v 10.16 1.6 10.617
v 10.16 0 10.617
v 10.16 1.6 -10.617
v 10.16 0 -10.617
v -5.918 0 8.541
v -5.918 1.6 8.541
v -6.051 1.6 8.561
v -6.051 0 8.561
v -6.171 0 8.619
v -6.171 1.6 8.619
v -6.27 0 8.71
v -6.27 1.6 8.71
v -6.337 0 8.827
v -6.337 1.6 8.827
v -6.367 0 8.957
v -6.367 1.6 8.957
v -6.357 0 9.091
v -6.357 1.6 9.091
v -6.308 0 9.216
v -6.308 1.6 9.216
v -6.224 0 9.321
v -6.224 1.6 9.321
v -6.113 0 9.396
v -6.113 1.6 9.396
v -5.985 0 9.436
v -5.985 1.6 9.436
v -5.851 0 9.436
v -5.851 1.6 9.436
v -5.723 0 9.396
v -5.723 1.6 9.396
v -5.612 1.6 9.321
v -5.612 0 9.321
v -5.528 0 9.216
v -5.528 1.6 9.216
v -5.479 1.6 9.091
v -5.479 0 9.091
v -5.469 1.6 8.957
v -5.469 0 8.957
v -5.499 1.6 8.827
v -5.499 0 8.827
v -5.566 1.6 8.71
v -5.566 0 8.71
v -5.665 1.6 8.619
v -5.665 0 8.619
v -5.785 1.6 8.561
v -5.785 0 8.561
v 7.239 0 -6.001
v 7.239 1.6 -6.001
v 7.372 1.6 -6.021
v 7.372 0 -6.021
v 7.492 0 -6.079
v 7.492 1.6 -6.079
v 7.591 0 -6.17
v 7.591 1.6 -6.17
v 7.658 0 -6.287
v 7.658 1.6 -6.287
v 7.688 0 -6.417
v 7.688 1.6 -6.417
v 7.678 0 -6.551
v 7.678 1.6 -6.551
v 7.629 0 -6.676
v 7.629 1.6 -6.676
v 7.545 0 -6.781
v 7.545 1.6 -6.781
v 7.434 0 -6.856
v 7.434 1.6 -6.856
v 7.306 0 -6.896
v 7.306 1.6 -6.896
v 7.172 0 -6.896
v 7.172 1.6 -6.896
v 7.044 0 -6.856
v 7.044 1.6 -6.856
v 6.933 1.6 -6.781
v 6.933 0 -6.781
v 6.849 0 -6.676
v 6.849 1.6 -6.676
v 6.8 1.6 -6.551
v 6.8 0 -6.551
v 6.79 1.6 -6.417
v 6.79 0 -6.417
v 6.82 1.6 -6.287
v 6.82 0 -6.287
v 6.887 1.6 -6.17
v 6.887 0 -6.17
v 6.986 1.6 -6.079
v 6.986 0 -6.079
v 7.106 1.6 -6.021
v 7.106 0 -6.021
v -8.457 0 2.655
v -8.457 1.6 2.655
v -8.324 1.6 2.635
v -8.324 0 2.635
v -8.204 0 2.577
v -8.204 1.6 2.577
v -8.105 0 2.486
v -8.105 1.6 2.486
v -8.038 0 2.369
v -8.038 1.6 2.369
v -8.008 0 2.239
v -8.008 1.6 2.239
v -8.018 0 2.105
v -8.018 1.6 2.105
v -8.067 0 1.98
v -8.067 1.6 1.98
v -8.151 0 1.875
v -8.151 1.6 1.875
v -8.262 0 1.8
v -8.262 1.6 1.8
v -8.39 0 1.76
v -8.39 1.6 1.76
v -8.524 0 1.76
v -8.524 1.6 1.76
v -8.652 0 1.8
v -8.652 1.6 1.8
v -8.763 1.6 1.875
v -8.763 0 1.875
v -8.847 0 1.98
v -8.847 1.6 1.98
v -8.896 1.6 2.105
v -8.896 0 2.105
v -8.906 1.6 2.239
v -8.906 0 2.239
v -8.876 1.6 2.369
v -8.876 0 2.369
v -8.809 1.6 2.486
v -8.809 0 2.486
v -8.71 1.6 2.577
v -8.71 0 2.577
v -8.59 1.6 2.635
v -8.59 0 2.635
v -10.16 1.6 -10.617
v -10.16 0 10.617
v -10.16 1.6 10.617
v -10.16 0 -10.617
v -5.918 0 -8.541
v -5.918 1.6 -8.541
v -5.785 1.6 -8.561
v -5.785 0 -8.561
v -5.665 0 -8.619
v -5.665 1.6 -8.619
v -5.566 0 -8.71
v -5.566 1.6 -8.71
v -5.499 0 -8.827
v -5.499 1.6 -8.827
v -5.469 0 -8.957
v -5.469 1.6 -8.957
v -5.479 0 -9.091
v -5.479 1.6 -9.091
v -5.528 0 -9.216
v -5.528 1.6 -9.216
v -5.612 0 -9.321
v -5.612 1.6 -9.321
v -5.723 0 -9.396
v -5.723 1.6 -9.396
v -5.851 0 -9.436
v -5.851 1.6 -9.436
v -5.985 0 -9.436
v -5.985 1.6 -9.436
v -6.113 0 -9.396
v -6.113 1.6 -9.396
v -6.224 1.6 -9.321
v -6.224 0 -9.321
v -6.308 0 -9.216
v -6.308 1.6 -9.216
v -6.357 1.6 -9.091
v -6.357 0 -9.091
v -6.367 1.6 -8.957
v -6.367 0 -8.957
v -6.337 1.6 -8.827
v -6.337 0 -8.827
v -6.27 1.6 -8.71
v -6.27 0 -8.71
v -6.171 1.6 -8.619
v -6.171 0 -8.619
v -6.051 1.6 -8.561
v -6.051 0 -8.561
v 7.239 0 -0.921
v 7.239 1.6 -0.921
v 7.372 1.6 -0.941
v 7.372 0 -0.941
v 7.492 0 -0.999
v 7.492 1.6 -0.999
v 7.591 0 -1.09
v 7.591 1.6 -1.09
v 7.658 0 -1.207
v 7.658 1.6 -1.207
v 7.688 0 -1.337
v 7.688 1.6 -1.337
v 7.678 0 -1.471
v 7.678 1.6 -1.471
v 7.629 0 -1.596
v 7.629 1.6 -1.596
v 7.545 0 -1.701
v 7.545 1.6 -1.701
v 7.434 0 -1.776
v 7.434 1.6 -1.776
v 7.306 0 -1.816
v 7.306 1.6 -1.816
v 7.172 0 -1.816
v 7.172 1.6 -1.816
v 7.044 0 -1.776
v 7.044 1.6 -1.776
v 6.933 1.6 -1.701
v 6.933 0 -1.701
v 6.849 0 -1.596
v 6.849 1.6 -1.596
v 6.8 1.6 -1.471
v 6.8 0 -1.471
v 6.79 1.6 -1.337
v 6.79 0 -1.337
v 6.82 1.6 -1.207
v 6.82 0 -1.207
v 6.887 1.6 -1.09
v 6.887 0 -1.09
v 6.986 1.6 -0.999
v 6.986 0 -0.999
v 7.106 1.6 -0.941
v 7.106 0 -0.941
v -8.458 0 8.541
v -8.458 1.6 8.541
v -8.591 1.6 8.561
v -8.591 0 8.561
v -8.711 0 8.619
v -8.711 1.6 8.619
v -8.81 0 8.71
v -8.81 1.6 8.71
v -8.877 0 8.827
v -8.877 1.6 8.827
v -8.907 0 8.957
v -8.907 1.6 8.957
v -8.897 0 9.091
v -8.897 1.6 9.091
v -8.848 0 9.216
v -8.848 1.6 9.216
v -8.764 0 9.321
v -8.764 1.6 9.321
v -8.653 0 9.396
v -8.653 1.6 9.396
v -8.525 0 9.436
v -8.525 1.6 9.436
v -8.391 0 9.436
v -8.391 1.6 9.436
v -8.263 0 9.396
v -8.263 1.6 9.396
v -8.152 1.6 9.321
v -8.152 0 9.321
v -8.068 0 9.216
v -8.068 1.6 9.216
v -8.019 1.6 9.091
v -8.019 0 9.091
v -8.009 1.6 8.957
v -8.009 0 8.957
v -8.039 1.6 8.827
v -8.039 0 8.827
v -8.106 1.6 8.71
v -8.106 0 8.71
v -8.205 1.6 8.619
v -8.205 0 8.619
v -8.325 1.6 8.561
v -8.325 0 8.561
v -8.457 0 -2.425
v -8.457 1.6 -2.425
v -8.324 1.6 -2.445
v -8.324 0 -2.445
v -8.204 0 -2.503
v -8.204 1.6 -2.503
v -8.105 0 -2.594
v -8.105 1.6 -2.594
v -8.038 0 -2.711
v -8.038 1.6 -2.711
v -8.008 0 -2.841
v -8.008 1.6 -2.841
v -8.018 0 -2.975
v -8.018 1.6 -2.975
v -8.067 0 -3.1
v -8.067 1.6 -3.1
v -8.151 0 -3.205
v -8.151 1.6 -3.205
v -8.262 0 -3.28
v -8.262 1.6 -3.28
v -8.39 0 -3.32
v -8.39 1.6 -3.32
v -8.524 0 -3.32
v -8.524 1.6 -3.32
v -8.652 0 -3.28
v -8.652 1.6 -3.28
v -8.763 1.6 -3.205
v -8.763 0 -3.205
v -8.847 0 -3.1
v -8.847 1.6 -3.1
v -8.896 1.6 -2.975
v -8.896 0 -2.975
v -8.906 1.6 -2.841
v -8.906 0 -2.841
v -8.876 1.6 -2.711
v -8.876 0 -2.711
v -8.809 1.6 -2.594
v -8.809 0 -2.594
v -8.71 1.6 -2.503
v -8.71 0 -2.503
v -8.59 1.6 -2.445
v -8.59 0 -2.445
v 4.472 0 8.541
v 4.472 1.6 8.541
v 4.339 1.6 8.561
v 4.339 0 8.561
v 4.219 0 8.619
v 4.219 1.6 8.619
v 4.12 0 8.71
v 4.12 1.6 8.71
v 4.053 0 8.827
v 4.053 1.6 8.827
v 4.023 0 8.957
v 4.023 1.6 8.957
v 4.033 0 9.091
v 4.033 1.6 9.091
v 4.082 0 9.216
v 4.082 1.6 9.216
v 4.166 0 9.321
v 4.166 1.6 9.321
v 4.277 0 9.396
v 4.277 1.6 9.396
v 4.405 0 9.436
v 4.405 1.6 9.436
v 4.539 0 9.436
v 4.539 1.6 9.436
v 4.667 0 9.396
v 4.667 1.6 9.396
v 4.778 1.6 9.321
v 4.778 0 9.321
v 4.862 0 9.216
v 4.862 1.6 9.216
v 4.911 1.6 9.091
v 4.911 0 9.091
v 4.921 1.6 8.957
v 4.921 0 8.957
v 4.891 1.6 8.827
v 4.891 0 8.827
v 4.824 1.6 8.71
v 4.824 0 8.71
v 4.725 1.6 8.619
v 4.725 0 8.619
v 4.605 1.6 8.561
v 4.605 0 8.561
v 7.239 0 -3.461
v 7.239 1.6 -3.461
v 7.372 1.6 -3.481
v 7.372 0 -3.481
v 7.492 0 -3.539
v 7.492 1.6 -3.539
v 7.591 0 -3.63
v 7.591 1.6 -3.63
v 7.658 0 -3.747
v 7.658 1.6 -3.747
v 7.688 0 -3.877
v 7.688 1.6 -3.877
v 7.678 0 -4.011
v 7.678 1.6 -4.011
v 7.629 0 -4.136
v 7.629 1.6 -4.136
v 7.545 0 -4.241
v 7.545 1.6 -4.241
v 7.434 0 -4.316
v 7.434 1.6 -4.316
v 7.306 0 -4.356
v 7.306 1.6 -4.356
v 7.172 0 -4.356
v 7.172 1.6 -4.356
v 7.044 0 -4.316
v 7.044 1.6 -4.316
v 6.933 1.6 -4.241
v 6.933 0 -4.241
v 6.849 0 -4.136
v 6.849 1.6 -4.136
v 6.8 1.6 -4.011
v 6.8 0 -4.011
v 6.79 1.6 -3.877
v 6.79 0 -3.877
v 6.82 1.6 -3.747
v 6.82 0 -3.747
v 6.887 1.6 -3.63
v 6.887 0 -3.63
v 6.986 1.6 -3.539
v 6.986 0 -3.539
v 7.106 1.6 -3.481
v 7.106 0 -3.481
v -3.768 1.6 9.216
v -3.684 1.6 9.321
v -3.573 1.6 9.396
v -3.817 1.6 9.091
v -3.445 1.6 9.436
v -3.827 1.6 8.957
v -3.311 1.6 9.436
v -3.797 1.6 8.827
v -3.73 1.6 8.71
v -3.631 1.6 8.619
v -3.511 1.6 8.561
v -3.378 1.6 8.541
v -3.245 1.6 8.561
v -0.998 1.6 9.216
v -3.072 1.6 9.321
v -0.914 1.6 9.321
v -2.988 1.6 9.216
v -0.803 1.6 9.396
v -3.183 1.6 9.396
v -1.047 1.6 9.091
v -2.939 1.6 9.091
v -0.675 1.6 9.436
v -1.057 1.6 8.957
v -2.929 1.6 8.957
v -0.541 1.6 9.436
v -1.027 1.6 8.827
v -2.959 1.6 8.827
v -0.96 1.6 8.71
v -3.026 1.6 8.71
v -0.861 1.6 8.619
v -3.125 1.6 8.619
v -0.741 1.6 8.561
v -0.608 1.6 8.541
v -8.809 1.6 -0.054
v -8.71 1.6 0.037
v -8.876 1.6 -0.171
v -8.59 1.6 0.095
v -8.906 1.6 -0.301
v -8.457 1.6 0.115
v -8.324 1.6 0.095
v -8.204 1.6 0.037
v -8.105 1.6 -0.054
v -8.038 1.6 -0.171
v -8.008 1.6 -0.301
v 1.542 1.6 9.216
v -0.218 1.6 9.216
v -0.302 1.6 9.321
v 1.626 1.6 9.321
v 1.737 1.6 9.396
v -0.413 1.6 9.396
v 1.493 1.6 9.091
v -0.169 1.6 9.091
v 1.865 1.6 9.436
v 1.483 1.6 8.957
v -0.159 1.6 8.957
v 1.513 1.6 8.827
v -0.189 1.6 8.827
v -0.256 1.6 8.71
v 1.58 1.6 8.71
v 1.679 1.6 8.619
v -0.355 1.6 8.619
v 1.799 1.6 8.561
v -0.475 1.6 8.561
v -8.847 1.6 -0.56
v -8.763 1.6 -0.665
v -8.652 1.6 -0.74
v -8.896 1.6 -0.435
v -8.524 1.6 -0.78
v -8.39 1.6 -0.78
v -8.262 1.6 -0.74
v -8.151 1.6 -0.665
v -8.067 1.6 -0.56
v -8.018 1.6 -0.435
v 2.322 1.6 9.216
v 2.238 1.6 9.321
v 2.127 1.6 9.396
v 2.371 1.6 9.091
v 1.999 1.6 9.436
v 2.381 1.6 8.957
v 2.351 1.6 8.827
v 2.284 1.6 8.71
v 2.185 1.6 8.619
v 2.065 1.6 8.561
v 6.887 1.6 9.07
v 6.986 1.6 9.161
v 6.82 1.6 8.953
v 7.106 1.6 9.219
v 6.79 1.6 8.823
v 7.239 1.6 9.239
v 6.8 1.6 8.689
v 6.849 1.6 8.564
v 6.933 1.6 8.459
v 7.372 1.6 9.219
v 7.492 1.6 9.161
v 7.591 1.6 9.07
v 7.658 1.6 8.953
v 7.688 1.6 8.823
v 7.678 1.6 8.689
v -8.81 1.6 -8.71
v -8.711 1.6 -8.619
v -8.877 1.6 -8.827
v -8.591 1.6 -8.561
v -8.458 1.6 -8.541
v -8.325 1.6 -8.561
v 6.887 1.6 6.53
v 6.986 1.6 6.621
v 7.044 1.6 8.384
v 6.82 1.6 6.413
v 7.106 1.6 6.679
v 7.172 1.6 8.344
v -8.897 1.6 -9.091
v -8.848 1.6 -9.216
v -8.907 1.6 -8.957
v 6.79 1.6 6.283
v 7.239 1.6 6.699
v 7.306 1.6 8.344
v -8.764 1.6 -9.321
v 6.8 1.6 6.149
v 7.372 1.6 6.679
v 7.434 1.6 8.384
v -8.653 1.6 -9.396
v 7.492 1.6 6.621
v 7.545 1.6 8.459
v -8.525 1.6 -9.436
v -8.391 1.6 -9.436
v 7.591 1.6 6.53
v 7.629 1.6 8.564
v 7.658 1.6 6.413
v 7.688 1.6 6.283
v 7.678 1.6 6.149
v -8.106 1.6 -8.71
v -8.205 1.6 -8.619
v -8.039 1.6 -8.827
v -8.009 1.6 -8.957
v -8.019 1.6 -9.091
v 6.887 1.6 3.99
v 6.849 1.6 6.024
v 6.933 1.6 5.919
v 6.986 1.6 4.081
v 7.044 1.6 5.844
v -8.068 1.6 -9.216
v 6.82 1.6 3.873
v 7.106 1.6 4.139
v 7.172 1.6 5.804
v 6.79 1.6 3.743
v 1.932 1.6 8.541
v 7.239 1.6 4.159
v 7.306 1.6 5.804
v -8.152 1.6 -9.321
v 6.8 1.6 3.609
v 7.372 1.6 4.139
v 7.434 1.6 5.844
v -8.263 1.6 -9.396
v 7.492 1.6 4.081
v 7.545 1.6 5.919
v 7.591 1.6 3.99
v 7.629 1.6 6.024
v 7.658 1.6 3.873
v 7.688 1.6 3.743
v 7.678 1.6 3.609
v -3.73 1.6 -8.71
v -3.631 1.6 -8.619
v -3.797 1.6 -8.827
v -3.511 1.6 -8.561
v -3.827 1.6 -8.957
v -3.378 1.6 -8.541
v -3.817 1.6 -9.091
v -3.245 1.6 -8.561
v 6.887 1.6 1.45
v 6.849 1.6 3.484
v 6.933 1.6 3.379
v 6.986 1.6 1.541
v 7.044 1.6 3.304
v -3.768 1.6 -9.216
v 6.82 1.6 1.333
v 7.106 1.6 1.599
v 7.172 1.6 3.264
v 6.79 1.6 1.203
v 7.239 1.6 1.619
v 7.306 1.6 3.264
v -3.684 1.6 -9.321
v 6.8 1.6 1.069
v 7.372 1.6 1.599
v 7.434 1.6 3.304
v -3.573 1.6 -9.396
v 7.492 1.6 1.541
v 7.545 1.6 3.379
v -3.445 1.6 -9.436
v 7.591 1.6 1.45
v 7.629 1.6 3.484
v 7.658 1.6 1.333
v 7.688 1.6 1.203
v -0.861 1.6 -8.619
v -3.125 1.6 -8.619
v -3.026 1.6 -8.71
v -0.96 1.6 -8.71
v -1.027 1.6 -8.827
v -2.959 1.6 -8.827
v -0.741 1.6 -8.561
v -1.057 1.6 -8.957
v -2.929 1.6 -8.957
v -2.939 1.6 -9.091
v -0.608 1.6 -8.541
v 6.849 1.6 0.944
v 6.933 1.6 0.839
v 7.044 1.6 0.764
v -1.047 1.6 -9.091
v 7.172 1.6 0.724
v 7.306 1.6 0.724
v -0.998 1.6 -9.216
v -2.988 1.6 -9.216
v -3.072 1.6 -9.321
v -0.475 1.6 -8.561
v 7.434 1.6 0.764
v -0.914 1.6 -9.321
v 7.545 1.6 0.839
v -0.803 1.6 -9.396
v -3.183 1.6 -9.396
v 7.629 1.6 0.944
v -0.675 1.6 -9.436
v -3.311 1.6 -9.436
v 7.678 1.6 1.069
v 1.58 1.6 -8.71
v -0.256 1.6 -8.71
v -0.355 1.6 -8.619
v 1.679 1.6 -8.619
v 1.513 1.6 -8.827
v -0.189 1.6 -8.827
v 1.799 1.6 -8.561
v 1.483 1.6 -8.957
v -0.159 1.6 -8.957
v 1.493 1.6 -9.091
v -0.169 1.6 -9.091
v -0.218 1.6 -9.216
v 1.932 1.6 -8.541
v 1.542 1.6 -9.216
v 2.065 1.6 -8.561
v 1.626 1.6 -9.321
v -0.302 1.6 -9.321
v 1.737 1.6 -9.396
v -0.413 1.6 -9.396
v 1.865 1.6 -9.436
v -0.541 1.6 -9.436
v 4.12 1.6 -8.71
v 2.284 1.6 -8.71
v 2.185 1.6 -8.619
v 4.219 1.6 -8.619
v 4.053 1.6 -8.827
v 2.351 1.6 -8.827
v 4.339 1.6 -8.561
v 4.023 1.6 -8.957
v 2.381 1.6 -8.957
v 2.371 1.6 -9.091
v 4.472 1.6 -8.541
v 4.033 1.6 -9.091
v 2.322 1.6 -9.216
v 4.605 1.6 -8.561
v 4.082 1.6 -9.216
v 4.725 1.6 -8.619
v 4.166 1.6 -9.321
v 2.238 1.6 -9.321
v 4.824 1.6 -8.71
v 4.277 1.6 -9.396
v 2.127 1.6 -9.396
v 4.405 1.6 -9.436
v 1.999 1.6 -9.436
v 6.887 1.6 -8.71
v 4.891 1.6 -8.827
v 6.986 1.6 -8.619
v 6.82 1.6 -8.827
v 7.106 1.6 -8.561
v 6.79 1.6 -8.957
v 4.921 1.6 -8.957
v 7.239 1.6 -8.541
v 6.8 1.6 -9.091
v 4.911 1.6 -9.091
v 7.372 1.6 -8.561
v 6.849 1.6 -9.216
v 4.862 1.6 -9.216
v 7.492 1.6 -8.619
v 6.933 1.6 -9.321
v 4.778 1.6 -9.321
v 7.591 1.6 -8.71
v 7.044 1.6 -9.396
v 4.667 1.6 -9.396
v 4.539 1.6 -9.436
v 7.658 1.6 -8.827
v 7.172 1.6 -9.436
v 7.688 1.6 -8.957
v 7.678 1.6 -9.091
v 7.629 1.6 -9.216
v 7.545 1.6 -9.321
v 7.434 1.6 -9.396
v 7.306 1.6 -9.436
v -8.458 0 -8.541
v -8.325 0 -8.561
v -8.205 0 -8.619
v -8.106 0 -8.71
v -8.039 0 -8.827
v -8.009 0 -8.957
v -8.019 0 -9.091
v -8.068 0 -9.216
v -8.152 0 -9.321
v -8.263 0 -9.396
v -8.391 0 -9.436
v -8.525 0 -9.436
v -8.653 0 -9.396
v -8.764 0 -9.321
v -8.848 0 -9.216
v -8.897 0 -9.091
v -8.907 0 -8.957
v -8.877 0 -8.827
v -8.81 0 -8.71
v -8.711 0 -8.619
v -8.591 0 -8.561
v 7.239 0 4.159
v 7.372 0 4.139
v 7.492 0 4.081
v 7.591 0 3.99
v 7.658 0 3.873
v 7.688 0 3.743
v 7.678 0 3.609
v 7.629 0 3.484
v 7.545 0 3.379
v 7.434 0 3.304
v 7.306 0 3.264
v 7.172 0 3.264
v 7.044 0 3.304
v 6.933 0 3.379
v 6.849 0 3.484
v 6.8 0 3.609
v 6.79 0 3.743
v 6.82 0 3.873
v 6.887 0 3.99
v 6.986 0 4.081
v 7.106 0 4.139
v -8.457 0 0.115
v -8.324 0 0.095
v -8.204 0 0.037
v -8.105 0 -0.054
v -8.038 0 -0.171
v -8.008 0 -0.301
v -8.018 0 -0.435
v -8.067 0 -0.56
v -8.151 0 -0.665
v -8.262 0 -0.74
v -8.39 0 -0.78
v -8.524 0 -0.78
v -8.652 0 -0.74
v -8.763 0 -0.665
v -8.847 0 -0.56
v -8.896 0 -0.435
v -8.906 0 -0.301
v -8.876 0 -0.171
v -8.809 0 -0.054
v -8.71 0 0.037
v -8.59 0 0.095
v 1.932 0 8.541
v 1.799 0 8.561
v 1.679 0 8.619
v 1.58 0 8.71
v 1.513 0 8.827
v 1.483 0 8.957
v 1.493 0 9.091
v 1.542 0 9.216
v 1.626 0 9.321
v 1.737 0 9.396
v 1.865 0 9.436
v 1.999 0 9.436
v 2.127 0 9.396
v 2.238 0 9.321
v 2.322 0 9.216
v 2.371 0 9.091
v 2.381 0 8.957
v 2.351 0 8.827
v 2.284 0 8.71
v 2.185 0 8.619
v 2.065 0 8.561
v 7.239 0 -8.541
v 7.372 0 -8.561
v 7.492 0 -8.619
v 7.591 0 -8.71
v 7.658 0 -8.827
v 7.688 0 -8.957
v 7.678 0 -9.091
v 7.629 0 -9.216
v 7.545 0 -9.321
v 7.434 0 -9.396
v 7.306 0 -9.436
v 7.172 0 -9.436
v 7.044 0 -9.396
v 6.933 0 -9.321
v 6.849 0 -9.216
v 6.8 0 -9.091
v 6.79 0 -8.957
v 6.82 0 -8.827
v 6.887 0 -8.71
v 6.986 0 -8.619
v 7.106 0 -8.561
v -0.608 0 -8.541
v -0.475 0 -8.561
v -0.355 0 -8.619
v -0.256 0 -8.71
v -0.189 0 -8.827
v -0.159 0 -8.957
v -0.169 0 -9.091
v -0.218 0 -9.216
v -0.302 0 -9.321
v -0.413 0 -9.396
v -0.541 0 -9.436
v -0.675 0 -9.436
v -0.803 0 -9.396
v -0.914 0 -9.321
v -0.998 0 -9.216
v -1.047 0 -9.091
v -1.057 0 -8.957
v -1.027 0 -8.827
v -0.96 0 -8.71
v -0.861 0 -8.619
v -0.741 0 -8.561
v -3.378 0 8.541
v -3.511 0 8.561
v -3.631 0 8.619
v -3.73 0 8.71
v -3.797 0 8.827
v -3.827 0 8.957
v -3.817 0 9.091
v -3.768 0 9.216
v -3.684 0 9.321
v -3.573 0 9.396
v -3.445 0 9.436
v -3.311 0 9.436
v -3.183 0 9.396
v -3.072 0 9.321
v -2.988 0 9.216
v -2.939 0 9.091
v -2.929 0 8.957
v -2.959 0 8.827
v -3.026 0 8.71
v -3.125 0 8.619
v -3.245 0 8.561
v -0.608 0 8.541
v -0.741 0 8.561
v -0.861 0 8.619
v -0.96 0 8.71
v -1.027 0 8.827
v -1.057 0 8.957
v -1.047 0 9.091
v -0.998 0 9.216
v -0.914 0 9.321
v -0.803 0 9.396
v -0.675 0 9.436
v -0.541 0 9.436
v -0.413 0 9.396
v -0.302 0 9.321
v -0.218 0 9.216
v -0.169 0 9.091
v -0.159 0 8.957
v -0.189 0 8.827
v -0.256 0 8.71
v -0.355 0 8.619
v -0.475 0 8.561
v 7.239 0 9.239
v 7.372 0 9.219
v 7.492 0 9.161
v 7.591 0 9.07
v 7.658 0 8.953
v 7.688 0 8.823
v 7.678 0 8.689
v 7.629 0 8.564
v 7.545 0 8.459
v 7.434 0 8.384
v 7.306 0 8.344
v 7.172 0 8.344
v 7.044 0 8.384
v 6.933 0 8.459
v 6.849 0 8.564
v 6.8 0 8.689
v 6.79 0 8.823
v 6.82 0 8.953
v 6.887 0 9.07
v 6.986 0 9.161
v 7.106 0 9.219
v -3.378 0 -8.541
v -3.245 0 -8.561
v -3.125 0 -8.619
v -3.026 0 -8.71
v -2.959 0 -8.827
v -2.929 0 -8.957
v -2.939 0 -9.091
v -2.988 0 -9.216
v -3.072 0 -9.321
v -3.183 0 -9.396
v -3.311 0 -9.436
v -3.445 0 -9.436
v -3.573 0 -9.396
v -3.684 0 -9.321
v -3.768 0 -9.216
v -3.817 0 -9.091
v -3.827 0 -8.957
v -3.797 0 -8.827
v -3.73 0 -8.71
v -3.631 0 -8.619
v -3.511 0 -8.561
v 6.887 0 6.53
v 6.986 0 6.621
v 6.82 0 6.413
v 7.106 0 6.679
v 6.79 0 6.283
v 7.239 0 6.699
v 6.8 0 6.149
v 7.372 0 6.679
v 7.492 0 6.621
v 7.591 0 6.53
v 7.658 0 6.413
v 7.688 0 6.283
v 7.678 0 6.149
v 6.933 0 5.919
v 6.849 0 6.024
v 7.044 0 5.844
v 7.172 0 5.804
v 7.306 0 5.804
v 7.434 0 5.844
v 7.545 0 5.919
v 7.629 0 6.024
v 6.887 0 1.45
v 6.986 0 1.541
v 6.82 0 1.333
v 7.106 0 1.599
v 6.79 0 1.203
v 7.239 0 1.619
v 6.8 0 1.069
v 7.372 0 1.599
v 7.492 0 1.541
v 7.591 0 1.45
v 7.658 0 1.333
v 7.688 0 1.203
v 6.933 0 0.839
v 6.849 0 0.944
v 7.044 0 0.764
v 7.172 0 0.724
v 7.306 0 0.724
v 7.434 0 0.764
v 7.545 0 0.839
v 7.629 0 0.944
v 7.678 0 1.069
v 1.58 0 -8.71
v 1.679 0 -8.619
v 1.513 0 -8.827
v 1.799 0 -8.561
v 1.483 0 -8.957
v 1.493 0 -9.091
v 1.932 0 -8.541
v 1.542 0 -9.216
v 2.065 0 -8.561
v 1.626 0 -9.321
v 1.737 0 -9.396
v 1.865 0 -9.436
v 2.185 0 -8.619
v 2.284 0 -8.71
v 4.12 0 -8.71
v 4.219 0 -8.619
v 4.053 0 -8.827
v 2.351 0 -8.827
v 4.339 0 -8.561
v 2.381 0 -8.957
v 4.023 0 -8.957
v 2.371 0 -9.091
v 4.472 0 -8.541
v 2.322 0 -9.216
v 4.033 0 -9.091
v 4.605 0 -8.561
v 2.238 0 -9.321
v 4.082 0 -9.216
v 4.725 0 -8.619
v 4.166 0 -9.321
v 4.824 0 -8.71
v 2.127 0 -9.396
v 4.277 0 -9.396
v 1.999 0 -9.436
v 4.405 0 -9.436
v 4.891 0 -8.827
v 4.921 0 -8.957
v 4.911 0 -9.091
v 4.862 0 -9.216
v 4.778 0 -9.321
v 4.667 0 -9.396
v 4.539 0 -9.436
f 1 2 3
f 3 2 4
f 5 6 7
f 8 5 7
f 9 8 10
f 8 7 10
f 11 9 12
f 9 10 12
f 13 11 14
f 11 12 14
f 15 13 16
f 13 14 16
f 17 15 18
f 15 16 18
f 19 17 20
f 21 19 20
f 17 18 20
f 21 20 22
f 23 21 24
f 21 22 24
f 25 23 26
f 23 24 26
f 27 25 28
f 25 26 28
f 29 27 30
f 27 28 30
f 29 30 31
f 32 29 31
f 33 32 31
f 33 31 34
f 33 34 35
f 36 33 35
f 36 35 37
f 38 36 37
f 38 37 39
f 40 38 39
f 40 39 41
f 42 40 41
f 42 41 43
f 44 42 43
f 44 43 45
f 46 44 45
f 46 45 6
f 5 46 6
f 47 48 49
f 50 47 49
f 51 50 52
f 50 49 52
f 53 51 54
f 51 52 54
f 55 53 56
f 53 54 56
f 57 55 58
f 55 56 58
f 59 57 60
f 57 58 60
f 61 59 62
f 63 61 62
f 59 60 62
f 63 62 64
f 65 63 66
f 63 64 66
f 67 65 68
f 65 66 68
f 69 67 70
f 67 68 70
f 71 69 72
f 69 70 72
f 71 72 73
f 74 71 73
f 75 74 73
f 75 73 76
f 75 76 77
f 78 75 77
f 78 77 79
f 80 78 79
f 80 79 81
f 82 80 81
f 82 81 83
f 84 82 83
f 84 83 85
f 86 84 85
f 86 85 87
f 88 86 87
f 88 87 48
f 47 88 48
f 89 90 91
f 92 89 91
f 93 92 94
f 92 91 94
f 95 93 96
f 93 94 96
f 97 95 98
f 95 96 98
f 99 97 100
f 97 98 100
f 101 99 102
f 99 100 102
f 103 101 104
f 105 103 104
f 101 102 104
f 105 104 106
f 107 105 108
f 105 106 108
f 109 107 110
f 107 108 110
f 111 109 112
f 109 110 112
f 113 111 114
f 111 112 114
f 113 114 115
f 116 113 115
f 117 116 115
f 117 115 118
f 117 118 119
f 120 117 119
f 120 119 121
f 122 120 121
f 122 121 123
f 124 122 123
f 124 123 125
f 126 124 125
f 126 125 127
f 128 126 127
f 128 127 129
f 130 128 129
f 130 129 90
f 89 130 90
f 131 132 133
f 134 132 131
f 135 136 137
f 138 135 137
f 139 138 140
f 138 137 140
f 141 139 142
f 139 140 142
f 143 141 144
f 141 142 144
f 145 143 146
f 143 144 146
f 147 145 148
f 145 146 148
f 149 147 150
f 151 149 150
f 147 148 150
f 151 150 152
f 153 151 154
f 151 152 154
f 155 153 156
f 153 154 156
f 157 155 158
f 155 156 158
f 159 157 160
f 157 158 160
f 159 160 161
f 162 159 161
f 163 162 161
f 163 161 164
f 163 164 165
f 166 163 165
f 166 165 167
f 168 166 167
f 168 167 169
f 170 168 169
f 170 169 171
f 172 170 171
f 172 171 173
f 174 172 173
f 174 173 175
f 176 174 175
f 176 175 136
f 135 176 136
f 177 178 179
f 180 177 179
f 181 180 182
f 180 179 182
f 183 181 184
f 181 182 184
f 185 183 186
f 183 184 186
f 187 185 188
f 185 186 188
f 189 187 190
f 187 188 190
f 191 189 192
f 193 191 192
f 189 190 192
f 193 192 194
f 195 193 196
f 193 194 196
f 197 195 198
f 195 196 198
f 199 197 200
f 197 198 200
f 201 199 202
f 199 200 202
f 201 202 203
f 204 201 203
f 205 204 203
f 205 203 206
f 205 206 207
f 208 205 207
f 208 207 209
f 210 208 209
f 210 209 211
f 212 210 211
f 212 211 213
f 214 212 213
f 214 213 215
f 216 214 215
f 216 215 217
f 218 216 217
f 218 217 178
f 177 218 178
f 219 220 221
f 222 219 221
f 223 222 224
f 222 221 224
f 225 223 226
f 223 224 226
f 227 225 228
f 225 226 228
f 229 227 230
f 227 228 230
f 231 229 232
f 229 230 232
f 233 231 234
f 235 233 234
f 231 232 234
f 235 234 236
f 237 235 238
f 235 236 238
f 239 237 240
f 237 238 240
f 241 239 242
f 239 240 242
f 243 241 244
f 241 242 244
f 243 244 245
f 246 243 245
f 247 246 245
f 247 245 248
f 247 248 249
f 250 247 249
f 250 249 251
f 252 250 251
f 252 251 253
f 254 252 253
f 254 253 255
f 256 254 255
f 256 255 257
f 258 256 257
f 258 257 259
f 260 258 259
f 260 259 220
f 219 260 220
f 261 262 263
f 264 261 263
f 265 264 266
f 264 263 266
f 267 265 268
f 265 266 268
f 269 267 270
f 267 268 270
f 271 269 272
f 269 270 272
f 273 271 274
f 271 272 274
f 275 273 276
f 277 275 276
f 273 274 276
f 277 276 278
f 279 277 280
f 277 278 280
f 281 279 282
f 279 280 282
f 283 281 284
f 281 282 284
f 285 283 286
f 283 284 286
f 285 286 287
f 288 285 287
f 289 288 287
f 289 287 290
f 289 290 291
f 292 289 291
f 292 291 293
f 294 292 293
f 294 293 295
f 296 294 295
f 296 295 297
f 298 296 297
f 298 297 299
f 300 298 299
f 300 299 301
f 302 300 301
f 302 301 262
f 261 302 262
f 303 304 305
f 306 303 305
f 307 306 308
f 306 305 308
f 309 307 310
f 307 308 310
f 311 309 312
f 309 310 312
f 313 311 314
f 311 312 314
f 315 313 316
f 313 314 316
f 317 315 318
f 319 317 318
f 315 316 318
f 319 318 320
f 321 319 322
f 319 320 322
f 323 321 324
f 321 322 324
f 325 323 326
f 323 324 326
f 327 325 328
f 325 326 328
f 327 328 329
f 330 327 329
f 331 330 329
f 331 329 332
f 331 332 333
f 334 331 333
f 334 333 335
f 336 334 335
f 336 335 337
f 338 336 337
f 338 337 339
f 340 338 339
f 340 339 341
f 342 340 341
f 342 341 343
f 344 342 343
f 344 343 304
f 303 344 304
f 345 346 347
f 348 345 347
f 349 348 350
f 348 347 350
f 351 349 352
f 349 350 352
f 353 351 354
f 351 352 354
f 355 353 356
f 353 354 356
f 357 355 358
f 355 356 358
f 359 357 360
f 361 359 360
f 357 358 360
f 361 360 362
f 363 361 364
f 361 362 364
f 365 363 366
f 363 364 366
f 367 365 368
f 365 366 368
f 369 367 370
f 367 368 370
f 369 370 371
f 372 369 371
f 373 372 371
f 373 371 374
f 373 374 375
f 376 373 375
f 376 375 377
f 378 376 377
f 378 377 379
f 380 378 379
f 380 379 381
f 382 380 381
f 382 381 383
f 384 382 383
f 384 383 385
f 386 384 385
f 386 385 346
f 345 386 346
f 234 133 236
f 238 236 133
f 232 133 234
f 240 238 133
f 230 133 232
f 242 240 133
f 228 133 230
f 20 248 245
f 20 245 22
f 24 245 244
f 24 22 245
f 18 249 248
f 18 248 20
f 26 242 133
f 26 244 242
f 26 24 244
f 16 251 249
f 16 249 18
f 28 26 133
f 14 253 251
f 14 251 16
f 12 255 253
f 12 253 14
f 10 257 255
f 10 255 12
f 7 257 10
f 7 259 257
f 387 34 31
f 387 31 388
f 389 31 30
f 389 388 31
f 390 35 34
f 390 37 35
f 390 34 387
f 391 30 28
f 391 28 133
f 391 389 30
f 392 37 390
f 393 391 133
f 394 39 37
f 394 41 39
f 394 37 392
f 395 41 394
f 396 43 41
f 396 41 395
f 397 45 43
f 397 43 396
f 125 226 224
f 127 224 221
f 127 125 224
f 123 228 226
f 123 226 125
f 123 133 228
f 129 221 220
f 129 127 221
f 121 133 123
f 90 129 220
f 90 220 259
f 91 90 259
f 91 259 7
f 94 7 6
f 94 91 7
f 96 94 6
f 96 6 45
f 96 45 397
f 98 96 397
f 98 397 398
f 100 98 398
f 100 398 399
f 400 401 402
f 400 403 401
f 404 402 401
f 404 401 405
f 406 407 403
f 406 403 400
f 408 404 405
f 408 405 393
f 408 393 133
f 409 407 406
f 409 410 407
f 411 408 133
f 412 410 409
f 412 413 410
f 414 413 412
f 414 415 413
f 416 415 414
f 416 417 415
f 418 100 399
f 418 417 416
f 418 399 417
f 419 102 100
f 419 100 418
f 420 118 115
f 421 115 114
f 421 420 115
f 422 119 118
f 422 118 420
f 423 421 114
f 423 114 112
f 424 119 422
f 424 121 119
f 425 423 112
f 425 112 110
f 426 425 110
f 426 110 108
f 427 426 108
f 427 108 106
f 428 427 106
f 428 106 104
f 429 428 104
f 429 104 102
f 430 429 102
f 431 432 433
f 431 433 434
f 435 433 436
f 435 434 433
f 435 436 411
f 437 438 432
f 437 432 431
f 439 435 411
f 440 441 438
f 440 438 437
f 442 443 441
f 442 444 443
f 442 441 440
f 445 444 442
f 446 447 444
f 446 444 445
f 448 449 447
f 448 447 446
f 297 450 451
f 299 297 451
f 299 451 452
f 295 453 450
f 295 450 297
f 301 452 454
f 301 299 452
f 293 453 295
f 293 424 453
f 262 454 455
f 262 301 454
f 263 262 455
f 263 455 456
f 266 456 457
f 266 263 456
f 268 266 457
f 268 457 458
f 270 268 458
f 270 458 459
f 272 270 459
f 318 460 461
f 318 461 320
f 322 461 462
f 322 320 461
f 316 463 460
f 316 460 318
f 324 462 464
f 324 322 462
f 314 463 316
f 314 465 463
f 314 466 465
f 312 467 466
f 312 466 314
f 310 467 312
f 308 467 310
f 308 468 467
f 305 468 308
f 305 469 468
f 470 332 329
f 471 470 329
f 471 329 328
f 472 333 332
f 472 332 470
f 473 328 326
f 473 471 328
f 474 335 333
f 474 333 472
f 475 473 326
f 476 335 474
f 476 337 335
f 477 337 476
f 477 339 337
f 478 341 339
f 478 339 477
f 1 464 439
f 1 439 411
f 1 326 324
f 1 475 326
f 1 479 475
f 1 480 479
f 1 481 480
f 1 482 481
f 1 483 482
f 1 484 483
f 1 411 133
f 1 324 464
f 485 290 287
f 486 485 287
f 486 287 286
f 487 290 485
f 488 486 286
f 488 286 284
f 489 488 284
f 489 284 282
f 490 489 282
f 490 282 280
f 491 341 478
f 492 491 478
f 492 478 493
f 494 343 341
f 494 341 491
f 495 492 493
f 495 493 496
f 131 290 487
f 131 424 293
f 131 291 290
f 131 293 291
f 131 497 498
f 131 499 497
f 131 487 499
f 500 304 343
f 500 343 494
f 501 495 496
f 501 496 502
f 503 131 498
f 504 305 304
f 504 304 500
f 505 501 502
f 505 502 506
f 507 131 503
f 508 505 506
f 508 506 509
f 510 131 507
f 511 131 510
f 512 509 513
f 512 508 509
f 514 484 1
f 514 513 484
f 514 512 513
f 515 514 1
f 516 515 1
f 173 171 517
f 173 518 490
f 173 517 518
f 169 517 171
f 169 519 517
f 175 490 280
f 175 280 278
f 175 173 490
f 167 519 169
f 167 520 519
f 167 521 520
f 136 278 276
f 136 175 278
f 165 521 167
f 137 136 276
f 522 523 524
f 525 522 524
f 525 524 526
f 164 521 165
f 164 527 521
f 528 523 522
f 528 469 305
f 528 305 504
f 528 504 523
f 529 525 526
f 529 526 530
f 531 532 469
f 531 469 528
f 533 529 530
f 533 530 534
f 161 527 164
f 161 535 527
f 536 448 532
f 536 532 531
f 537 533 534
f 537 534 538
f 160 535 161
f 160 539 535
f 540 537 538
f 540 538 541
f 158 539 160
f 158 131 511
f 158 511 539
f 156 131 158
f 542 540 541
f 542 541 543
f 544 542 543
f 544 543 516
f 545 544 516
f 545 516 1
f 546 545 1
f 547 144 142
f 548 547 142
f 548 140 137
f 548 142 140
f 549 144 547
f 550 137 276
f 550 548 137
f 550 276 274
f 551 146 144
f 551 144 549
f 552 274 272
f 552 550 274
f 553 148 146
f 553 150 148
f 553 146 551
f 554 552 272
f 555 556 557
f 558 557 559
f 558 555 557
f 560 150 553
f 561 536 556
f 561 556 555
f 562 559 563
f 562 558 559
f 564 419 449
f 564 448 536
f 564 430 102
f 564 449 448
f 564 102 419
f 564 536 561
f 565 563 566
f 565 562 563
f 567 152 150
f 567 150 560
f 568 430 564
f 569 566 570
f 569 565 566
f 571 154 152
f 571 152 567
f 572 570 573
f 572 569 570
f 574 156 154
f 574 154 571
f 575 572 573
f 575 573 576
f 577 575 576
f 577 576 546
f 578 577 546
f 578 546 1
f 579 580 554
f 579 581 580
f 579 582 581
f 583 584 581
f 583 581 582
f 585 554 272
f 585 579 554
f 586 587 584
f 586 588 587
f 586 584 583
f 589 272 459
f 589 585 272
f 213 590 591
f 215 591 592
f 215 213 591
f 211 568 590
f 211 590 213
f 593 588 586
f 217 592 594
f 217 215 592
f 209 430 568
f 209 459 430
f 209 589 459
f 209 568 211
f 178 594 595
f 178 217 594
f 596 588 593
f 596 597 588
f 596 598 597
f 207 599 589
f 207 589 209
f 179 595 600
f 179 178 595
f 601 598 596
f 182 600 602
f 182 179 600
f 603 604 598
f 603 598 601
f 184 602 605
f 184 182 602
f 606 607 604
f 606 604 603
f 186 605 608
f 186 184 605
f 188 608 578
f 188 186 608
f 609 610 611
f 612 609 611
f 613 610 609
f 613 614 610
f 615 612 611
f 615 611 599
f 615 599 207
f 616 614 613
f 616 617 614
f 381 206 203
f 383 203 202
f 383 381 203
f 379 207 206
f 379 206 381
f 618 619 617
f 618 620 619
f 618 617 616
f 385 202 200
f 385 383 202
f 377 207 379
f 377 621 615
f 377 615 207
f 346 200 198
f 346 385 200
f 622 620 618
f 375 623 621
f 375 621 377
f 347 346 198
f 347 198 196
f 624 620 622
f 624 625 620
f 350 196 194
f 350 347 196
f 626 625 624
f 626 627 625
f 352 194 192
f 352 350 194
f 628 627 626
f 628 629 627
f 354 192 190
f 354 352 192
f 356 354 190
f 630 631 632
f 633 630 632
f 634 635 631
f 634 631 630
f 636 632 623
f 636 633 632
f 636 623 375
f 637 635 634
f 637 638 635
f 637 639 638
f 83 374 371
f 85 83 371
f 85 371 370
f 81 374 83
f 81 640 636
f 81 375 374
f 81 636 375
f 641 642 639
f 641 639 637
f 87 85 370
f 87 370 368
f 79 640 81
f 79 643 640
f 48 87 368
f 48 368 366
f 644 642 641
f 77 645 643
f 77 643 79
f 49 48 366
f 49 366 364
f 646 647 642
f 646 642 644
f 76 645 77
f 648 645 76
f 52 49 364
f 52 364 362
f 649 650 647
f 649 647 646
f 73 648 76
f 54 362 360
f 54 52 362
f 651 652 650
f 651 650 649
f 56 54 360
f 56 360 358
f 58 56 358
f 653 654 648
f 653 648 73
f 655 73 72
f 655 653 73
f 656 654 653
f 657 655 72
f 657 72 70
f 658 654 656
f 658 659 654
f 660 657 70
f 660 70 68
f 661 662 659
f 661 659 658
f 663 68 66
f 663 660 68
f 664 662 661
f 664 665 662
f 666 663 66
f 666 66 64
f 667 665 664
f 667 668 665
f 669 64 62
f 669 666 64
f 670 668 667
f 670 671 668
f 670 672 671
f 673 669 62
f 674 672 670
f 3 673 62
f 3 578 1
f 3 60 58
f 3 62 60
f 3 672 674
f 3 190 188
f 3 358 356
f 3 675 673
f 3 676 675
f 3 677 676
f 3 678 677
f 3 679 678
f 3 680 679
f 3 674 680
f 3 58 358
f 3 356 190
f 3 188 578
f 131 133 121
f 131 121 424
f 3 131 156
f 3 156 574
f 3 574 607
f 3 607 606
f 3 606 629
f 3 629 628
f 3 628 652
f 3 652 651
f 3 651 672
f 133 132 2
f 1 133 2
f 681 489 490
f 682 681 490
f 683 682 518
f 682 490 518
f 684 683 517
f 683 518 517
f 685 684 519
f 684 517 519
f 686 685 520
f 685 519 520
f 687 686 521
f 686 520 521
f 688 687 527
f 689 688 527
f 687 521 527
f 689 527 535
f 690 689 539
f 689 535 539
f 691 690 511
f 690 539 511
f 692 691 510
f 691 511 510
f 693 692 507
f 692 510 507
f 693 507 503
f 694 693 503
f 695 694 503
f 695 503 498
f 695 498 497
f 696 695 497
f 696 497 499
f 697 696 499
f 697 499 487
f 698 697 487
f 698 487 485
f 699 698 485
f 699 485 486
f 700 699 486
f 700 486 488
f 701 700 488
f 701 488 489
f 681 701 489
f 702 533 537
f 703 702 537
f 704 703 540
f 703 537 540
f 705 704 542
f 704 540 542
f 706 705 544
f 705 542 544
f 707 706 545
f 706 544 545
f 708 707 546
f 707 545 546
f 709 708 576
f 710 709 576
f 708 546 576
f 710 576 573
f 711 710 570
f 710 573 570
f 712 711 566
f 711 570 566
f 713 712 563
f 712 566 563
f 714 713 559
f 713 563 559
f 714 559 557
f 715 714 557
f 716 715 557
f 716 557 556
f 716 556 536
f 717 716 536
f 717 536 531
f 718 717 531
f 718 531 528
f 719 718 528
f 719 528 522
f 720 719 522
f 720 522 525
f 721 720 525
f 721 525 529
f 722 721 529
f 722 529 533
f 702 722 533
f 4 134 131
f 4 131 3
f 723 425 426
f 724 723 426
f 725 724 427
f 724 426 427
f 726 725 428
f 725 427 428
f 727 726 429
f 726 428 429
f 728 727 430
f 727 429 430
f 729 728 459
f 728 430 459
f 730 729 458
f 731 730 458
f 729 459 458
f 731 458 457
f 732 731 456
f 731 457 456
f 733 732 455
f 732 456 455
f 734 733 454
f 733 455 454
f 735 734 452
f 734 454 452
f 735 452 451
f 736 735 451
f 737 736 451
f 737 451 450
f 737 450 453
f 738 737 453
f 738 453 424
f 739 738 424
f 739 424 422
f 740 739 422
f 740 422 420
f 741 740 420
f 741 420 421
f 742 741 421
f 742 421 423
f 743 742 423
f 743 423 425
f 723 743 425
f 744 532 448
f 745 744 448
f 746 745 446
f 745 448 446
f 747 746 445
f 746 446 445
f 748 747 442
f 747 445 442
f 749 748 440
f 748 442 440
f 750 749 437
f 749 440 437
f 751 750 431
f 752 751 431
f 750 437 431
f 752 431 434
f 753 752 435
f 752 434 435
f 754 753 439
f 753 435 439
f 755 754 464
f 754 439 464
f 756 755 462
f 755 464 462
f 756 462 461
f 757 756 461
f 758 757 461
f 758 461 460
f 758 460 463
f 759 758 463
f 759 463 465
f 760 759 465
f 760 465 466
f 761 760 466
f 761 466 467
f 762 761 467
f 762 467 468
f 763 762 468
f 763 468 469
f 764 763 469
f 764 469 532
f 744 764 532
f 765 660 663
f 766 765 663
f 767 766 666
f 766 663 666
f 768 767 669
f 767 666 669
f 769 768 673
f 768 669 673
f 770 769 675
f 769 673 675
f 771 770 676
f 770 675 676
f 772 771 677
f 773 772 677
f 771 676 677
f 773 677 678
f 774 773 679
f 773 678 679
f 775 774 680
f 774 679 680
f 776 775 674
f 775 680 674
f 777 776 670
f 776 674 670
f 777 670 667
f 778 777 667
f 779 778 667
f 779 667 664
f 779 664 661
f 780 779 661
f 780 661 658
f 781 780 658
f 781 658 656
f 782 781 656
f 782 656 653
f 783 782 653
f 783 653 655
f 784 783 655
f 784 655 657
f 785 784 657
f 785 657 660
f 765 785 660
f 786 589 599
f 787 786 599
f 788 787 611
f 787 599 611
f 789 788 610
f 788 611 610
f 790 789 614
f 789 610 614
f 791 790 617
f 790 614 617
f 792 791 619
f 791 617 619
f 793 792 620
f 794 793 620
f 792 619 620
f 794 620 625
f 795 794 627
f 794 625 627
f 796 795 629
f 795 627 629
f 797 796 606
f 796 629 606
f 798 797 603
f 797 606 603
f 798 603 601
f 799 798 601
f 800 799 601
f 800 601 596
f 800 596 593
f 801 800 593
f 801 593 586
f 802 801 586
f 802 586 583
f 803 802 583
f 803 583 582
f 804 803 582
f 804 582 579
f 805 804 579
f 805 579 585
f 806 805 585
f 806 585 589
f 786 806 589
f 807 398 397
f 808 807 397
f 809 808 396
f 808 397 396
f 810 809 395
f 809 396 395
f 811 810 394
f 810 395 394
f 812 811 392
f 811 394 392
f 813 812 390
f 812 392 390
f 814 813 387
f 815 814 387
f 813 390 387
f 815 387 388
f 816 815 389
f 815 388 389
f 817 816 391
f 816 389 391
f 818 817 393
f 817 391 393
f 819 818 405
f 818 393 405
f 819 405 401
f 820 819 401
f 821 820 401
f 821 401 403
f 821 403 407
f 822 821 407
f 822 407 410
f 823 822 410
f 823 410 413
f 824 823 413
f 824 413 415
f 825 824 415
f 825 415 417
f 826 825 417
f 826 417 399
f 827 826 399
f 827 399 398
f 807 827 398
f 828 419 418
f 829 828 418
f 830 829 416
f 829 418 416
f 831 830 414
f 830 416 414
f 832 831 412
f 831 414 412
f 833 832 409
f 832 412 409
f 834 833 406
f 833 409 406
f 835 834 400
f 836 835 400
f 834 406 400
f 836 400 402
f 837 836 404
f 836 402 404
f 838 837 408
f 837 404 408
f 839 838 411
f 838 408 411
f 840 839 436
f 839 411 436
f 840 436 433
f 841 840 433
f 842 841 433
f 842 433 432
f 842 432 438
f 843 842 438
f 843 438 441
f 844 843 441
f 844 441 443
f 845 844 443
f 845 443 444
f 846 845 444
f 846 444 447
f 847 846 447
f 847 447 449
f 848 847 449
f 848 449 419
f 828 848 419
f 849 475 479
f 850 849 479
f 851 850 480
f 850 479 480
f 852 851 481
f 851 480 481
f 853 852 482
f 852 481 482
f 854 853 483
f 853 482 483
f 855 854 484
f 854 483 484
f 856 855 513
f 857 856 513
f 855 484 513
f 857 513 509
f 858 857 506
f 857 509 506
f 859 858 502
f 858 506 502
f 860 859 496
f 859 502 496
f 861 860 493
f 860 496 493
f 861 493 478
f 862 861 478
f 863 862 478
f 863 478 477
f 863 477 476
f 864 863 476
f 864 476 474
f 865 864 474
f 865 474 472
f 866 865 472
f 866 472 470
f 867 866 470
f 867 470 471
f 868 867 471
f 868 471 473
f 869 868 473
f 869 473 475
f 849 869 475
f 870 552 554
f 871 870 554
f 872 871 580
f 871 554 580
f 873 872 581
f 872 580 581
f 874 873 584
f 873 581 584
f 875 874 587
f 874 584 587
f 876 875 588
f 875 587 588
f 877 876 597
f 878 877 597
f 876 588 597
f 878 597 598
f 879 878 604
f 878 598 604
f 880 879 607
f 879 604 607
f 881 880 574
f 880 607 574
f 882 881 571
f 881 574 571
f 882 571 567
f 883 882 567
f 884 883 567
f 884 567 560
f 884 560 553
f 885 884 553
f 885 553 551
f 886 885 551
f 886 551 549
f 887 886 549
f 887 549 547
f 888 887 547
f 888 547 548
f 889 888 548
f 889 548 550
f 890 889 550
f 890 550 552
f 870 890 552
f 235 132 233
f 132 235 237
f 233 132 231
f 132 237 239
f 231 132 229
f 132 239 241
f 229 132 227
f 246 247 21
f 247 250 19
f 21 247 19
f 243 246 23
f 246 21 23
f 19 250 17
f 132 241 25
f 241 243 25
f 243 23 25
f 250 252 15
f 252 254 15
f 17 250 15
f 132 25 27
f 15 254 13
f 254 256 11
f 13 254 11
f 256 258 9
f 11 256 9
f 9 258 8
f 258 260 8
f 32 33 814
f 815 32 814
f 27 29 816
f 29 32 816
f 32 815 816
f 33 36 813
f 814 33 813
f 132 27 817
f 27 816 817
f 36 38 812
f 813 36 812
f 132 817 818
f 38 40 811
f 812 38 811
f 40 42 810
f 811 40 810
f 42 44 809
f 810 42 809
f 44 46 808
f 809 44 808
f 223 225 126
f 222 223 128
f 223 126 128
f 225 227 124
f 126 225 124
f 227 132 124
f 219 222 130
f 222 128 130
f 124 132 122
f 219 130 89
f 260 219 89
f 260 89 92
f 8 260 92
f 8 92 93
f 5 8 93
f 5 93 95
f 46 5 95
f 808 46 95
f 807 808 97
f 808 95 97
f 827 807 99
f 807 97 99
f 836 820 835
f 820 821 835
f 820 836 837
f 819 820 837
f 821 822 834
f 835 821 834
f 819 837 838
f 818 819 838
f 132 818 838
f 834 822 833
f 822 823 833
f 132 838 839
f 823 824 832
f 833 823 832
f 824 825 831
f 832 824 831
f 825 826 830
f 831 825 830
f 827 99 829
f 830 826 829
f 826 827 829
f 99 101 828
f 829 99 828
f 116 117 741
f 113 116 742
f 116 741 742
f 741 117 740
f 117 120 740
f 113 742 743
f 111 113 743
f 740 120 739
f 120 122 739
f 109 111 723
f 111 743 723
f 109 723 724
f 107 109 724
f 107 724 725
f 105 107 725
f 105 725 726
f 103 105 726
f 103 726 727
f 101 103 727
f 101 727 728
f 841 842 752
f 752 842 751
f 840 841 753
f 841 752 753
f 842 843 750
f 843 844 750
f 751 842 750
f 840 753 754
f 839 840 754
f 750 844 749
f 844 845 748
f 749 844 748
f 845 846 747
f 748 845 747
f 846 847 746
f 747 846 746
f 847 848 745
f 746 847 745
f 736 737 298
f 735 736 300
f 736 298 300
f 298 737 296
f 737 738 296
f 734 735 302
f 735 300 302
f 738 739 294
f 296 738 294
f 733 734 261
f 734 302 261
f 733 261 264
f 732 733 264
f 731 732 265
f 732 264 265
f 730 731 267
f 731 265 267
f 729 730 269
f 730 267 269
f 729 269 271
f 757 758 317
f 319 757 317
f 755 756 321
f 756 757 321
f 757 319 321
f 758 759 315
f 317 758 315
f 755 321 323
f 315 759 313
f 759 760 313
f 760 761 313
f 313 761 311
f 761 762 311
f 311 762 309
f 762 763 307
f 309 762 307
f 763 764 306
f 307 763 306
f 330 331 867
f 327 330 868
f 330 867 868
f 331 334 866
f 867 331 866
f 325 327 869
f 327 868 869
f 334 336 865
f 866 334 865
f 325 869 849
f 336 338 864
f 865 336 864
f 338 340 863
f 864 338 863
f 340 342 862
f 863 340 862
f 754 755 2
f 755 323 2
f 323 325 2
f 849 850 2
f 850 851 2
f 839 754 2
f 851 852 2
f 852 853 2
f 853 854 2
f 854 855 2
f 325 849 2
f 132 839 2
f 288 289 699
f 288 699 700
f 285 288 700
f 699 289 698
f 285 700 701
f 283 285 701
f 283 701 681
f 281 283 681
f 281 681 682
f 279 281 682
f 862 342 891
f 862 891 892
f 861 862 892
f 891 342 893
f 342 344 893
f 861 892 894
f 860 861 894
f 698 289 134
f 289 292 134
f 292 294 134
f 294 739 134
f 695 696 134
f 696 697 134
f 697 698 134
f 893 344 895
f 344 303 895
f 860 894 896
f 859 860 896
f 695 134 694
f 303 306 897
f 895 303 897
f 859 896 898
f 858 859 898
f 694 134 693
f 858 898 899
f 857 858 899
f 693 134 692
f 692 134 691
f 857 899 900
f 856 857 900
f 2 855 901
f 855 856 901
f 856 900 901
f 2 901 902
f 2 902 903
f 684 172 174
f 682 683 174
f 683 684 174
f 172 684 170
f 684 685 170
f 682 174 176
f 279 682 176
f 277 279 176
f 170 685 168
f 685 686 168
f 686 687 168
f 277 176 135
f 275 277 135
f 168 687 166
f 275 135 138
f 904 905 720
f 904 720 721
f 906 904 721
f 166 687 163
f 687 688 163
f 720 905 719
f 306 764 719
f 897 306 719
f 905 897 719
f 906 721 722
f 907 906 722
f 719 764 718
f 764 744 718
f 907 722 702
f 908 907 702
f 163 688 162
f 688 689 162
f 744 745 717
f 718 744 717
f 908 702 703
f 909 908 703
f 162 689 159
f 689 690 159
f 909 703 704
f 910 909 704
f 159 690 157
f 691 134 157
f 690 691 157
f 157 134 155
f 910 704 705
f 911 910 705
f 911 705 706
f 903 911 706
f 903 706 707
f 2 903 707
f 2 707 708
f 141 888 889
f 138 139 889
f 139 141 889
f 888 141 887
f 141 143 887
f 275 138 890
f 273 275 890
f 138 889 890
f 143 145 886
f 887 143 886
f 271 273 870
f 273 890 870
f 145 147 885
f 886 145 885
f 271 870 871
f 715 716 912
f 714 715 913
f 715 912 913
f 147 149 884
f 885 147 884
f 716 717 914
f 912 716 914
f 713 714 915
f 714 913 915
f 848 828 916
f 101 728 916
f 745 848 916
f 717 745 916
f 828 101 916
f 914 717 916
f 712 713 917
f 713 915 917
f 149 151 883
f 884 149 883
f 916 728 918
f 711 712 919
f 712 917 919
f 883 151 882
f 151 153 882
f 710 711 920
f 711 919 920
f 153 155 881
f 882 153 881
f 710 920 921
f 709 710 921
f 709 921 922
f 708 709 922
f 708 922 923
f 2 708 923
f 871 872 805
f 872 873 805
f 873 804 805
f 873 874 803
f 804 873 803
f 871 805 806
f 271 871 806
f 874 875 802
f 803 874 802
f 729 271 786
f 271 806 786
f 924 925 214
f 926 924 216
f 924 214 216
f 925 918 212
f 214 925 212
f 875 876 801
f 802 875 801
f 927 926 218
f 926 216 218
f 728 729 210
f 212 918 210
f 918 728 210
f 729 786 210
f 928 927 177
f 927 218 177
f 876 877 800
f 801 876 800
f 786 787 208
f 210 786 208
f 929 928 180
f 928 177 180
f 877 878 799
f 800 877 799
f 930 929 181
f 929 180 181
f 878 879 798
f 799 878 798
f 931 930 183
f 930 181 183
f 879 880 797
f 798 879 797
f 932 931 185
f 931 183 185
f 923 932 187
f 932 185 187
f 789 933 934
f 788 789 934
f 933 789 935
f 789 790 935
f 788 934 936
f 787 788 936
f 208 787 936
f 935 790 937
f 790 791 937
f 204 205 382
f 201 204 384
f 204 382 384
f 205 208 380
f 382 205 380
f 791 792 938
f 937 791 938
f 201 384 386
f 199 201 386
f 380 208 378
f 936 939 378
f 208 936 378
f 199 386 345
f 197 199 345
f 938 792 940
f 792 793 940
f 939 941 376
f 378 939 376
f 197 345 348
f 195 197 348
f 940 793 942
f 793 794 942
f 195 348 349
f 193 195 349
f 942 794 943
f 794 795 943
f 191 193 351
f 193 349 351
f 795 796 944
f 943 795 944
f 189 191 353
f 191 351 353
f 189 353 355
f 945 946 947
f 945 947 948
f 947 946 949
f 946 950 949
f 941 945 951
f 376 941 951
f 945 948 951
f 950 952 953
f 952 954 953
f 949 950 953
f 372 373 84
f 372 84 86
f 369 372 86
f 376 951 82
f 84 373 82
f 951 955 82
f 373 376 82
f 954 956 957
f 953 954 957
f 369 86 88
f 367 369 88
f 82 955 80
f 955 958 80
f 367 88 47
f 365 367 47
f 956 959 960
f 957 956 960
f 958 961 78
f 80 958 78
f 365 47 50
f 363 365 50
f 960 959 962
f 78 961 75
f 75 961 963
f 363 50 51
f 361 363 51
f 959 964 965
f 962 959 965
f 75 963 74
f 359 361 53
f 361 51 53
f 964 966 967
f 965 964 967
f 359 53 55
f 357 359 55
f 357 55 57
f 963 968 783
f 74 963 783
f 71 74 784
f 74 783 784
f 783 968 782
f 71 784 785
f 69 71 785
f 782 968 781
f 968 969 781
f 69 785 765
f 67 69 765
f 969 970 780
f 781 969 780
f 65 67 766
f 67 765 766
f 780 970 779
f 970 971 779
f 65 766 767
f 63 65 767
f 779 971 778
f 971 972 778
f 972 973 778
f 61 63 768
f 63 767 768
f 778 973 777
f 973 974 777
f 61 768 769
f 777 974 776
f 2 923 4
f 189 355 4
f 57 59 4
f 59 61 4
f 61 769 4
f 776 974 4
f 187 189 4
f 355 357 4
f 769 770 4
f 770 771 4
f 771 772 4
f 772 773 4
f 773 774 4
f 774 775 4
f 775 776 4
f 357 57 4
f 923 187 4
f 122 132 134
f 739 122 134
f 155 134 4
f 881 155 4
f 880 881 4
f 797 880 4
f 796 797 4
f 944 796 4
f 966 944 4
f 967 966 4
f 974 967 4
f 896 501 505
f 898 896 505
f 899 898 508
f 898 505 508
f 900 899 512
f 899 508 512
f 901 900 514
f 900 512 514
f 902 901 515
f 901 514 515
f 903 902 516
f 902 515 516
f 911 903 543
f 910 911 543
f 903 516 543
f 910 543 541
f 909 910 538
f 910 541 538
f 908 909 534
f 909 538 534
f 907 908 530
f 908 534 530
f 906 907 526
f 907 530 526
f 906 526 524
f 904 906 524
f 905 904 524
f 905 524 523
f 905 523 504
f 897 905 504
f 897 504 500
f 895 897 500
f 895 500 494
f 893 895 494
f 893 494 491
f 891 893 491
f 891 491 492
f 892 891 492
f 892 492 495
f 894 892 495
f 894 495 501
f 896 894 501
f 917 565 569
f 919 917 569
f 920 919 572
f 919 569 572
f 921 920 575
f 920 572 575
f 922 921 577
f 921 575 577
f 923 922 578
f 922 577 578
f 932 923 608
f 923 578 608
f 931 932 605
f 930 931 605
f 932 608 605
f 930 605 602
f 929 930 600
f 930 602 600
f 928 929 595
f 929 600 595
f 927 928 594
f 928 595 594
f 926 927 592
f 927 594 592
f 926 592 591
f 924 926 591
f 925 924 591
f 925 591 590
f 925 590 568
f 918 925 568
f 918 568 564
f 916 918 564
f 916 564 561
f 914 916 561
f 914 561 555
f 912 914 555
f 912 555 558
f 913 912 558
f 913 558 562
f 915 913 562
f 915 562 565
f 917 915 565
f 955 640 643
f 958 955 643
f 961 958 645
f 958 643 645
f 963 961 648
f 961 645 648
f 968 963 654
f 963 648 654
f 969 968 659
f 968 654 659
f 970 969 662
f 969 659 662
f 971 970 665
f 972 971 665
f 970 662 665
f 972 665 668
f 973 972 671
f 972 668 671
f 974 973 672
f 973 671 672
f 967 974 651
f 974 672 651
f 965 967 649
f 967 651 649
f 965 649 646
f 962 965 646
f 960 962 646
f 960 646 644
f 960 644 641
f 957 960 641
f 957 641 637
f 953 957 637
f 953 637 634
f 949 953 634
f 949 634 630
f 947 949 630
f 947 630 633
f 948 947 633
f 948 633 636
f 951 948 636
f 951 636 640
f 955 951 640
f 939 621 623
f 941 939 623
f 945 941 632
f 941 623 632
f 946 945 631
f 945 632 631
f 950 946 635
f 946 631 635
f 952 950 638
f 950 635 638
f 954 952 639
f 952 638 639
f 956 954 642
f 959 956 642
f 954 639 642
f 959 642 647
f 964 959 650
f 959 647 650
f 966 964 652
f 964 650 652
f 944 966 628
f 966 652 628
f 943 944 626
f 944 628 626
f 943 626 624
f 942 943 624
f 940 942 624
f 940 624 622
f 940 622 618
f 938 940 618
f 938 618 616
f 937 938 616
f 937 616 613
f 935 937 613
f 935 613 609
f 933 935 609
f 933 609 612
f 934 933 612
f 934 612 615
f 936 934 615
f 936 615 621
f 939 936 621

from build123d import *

# Parameters (mm, degrees)
SKETCH_1_W          = 20.32
SKETCH_1_H          = 21.234
EXTRUDE_1_DEPTH     = 1.6
SKETCH_3_R          = 0.45
CUT_EXTRUDE_1_DEPTH = 15.781958226


with BuildPart() as part:
    # Эскиз1 → Бобышка-Вытянуть1 (new body)
    with BuildSketch(Plane(origin=(0, 0, 0), x_dir=(1, 0, 0), z_dir=(0, 1, 0))):
        Rectangle(SKETCH_1_W, SKETCH_1_H)
    extrude(amount=EXTRUDE_1_DEPTH)

    # Эскиз3 → Вырез-Вытянуть1 (cut, through all)
    with BuildSketch(Plane(origin=(0, 1.6, 0), x_dir=(1, 0, 0), z_dir=(0, 1, 0))):
        with Locations(Location((-8.458, 8.991, 0), (0, 0, 270))):
            Circle(SKETCH_3_R)
        with Locations(Location((-5.918, 8.991, 0), (0, 0, 270))):
            Circle(SKETCH_3_R)
        with Locations(Location((-3.378, 8.991, 0), (0, 0, 270))):
            Circle(SKETCH_3_R)
        with Locations(Location((-0.608, 8.991, 0), (0, 0, 270))):
            Circle(SKETCH_3_R)
        with Locations(Location((1.932, 8.991, 0), (0, 0, 270))):
            Circle(SKETCH_3_R)
        with Locations(Location((4.472, 8.991, 0), (0, 0, 270))):
            Circle(SKETCH_3_R)
        with Locations(Location((4.472, -8.991, 0), (0, 0, 90))):
            Circle(SKETCH_3_R)
        with Locations(Location((1.932, -8.991, 0), (0, 0, 90))):
            Circle(SKETCH_3_R)
        with Locations(Location((-0.608, -8.991, 0), (0, 0, 90))):
            Circle(SKETCH_3_R)
        with Locations(Location((-3.378, -8.991, 0), (0, 0, 90))):
            Circle(SKETCH_3_R)
        with Locations(Location((-5.918, -8.991, 0), (0, 0, 90))):
            Circle(SKETCH_3_R)
        with Locations(Location((-8.458, -8.991, 0), (0, 0, 90))):
            Circle(SKETCH_3_R)
        with Locations(Location((7.239, 8.991, 0), (0, 0, 270))):
            Circle(SKETCH_3_R)
        with Locations(Location((7.239, 6.451, 0), (0, 0, 270))):
            Circle(SKETCH_3_R)
        with Locations(Location((7.239, 3.911, 0), (0, 0, 270))):
            Circle(SKETCH_3_R)
        with Locations(Location((7.239, 1.371, 0), (0, 0, 270))):
            Circle(SKETCH_3_R)
        with Locations(Location((7.239, -1.169, 0), (0, 0, 270))):
            Circle(SKETCH_3_R)
        with Locations(Location((7.239, -3.709, 0), (0, 0, 270))):
            Circle(SKETCH_3_R)
        with Locations(Location((7.239, -6.249, 0), (0, 0, 270))):
            Circle(SKETCH_3_R)
        with Locations(Location((7.239, -8.789, 0), (0, 0, 270))):
            Circle(SKETCH_3_R)
        with Locations(Location((-8.457, 2.875, 0), (0, 0, 270))):
            Circle(SKETCH_3_R)
        with Locations(Location((-8.457, 0.335, 0), (0, 0, 270))):
            Circle(SKETCH_3_R)
        with Locations(Location((-8.457, -2.205, 0), (0, 0, 270))):
            Circle(SKETCH_3_R)
    extrude(amount=-CUT_EXTRUDE_1_DEPTH, mode=Mode.SUBTRACT)


solid = part.part
